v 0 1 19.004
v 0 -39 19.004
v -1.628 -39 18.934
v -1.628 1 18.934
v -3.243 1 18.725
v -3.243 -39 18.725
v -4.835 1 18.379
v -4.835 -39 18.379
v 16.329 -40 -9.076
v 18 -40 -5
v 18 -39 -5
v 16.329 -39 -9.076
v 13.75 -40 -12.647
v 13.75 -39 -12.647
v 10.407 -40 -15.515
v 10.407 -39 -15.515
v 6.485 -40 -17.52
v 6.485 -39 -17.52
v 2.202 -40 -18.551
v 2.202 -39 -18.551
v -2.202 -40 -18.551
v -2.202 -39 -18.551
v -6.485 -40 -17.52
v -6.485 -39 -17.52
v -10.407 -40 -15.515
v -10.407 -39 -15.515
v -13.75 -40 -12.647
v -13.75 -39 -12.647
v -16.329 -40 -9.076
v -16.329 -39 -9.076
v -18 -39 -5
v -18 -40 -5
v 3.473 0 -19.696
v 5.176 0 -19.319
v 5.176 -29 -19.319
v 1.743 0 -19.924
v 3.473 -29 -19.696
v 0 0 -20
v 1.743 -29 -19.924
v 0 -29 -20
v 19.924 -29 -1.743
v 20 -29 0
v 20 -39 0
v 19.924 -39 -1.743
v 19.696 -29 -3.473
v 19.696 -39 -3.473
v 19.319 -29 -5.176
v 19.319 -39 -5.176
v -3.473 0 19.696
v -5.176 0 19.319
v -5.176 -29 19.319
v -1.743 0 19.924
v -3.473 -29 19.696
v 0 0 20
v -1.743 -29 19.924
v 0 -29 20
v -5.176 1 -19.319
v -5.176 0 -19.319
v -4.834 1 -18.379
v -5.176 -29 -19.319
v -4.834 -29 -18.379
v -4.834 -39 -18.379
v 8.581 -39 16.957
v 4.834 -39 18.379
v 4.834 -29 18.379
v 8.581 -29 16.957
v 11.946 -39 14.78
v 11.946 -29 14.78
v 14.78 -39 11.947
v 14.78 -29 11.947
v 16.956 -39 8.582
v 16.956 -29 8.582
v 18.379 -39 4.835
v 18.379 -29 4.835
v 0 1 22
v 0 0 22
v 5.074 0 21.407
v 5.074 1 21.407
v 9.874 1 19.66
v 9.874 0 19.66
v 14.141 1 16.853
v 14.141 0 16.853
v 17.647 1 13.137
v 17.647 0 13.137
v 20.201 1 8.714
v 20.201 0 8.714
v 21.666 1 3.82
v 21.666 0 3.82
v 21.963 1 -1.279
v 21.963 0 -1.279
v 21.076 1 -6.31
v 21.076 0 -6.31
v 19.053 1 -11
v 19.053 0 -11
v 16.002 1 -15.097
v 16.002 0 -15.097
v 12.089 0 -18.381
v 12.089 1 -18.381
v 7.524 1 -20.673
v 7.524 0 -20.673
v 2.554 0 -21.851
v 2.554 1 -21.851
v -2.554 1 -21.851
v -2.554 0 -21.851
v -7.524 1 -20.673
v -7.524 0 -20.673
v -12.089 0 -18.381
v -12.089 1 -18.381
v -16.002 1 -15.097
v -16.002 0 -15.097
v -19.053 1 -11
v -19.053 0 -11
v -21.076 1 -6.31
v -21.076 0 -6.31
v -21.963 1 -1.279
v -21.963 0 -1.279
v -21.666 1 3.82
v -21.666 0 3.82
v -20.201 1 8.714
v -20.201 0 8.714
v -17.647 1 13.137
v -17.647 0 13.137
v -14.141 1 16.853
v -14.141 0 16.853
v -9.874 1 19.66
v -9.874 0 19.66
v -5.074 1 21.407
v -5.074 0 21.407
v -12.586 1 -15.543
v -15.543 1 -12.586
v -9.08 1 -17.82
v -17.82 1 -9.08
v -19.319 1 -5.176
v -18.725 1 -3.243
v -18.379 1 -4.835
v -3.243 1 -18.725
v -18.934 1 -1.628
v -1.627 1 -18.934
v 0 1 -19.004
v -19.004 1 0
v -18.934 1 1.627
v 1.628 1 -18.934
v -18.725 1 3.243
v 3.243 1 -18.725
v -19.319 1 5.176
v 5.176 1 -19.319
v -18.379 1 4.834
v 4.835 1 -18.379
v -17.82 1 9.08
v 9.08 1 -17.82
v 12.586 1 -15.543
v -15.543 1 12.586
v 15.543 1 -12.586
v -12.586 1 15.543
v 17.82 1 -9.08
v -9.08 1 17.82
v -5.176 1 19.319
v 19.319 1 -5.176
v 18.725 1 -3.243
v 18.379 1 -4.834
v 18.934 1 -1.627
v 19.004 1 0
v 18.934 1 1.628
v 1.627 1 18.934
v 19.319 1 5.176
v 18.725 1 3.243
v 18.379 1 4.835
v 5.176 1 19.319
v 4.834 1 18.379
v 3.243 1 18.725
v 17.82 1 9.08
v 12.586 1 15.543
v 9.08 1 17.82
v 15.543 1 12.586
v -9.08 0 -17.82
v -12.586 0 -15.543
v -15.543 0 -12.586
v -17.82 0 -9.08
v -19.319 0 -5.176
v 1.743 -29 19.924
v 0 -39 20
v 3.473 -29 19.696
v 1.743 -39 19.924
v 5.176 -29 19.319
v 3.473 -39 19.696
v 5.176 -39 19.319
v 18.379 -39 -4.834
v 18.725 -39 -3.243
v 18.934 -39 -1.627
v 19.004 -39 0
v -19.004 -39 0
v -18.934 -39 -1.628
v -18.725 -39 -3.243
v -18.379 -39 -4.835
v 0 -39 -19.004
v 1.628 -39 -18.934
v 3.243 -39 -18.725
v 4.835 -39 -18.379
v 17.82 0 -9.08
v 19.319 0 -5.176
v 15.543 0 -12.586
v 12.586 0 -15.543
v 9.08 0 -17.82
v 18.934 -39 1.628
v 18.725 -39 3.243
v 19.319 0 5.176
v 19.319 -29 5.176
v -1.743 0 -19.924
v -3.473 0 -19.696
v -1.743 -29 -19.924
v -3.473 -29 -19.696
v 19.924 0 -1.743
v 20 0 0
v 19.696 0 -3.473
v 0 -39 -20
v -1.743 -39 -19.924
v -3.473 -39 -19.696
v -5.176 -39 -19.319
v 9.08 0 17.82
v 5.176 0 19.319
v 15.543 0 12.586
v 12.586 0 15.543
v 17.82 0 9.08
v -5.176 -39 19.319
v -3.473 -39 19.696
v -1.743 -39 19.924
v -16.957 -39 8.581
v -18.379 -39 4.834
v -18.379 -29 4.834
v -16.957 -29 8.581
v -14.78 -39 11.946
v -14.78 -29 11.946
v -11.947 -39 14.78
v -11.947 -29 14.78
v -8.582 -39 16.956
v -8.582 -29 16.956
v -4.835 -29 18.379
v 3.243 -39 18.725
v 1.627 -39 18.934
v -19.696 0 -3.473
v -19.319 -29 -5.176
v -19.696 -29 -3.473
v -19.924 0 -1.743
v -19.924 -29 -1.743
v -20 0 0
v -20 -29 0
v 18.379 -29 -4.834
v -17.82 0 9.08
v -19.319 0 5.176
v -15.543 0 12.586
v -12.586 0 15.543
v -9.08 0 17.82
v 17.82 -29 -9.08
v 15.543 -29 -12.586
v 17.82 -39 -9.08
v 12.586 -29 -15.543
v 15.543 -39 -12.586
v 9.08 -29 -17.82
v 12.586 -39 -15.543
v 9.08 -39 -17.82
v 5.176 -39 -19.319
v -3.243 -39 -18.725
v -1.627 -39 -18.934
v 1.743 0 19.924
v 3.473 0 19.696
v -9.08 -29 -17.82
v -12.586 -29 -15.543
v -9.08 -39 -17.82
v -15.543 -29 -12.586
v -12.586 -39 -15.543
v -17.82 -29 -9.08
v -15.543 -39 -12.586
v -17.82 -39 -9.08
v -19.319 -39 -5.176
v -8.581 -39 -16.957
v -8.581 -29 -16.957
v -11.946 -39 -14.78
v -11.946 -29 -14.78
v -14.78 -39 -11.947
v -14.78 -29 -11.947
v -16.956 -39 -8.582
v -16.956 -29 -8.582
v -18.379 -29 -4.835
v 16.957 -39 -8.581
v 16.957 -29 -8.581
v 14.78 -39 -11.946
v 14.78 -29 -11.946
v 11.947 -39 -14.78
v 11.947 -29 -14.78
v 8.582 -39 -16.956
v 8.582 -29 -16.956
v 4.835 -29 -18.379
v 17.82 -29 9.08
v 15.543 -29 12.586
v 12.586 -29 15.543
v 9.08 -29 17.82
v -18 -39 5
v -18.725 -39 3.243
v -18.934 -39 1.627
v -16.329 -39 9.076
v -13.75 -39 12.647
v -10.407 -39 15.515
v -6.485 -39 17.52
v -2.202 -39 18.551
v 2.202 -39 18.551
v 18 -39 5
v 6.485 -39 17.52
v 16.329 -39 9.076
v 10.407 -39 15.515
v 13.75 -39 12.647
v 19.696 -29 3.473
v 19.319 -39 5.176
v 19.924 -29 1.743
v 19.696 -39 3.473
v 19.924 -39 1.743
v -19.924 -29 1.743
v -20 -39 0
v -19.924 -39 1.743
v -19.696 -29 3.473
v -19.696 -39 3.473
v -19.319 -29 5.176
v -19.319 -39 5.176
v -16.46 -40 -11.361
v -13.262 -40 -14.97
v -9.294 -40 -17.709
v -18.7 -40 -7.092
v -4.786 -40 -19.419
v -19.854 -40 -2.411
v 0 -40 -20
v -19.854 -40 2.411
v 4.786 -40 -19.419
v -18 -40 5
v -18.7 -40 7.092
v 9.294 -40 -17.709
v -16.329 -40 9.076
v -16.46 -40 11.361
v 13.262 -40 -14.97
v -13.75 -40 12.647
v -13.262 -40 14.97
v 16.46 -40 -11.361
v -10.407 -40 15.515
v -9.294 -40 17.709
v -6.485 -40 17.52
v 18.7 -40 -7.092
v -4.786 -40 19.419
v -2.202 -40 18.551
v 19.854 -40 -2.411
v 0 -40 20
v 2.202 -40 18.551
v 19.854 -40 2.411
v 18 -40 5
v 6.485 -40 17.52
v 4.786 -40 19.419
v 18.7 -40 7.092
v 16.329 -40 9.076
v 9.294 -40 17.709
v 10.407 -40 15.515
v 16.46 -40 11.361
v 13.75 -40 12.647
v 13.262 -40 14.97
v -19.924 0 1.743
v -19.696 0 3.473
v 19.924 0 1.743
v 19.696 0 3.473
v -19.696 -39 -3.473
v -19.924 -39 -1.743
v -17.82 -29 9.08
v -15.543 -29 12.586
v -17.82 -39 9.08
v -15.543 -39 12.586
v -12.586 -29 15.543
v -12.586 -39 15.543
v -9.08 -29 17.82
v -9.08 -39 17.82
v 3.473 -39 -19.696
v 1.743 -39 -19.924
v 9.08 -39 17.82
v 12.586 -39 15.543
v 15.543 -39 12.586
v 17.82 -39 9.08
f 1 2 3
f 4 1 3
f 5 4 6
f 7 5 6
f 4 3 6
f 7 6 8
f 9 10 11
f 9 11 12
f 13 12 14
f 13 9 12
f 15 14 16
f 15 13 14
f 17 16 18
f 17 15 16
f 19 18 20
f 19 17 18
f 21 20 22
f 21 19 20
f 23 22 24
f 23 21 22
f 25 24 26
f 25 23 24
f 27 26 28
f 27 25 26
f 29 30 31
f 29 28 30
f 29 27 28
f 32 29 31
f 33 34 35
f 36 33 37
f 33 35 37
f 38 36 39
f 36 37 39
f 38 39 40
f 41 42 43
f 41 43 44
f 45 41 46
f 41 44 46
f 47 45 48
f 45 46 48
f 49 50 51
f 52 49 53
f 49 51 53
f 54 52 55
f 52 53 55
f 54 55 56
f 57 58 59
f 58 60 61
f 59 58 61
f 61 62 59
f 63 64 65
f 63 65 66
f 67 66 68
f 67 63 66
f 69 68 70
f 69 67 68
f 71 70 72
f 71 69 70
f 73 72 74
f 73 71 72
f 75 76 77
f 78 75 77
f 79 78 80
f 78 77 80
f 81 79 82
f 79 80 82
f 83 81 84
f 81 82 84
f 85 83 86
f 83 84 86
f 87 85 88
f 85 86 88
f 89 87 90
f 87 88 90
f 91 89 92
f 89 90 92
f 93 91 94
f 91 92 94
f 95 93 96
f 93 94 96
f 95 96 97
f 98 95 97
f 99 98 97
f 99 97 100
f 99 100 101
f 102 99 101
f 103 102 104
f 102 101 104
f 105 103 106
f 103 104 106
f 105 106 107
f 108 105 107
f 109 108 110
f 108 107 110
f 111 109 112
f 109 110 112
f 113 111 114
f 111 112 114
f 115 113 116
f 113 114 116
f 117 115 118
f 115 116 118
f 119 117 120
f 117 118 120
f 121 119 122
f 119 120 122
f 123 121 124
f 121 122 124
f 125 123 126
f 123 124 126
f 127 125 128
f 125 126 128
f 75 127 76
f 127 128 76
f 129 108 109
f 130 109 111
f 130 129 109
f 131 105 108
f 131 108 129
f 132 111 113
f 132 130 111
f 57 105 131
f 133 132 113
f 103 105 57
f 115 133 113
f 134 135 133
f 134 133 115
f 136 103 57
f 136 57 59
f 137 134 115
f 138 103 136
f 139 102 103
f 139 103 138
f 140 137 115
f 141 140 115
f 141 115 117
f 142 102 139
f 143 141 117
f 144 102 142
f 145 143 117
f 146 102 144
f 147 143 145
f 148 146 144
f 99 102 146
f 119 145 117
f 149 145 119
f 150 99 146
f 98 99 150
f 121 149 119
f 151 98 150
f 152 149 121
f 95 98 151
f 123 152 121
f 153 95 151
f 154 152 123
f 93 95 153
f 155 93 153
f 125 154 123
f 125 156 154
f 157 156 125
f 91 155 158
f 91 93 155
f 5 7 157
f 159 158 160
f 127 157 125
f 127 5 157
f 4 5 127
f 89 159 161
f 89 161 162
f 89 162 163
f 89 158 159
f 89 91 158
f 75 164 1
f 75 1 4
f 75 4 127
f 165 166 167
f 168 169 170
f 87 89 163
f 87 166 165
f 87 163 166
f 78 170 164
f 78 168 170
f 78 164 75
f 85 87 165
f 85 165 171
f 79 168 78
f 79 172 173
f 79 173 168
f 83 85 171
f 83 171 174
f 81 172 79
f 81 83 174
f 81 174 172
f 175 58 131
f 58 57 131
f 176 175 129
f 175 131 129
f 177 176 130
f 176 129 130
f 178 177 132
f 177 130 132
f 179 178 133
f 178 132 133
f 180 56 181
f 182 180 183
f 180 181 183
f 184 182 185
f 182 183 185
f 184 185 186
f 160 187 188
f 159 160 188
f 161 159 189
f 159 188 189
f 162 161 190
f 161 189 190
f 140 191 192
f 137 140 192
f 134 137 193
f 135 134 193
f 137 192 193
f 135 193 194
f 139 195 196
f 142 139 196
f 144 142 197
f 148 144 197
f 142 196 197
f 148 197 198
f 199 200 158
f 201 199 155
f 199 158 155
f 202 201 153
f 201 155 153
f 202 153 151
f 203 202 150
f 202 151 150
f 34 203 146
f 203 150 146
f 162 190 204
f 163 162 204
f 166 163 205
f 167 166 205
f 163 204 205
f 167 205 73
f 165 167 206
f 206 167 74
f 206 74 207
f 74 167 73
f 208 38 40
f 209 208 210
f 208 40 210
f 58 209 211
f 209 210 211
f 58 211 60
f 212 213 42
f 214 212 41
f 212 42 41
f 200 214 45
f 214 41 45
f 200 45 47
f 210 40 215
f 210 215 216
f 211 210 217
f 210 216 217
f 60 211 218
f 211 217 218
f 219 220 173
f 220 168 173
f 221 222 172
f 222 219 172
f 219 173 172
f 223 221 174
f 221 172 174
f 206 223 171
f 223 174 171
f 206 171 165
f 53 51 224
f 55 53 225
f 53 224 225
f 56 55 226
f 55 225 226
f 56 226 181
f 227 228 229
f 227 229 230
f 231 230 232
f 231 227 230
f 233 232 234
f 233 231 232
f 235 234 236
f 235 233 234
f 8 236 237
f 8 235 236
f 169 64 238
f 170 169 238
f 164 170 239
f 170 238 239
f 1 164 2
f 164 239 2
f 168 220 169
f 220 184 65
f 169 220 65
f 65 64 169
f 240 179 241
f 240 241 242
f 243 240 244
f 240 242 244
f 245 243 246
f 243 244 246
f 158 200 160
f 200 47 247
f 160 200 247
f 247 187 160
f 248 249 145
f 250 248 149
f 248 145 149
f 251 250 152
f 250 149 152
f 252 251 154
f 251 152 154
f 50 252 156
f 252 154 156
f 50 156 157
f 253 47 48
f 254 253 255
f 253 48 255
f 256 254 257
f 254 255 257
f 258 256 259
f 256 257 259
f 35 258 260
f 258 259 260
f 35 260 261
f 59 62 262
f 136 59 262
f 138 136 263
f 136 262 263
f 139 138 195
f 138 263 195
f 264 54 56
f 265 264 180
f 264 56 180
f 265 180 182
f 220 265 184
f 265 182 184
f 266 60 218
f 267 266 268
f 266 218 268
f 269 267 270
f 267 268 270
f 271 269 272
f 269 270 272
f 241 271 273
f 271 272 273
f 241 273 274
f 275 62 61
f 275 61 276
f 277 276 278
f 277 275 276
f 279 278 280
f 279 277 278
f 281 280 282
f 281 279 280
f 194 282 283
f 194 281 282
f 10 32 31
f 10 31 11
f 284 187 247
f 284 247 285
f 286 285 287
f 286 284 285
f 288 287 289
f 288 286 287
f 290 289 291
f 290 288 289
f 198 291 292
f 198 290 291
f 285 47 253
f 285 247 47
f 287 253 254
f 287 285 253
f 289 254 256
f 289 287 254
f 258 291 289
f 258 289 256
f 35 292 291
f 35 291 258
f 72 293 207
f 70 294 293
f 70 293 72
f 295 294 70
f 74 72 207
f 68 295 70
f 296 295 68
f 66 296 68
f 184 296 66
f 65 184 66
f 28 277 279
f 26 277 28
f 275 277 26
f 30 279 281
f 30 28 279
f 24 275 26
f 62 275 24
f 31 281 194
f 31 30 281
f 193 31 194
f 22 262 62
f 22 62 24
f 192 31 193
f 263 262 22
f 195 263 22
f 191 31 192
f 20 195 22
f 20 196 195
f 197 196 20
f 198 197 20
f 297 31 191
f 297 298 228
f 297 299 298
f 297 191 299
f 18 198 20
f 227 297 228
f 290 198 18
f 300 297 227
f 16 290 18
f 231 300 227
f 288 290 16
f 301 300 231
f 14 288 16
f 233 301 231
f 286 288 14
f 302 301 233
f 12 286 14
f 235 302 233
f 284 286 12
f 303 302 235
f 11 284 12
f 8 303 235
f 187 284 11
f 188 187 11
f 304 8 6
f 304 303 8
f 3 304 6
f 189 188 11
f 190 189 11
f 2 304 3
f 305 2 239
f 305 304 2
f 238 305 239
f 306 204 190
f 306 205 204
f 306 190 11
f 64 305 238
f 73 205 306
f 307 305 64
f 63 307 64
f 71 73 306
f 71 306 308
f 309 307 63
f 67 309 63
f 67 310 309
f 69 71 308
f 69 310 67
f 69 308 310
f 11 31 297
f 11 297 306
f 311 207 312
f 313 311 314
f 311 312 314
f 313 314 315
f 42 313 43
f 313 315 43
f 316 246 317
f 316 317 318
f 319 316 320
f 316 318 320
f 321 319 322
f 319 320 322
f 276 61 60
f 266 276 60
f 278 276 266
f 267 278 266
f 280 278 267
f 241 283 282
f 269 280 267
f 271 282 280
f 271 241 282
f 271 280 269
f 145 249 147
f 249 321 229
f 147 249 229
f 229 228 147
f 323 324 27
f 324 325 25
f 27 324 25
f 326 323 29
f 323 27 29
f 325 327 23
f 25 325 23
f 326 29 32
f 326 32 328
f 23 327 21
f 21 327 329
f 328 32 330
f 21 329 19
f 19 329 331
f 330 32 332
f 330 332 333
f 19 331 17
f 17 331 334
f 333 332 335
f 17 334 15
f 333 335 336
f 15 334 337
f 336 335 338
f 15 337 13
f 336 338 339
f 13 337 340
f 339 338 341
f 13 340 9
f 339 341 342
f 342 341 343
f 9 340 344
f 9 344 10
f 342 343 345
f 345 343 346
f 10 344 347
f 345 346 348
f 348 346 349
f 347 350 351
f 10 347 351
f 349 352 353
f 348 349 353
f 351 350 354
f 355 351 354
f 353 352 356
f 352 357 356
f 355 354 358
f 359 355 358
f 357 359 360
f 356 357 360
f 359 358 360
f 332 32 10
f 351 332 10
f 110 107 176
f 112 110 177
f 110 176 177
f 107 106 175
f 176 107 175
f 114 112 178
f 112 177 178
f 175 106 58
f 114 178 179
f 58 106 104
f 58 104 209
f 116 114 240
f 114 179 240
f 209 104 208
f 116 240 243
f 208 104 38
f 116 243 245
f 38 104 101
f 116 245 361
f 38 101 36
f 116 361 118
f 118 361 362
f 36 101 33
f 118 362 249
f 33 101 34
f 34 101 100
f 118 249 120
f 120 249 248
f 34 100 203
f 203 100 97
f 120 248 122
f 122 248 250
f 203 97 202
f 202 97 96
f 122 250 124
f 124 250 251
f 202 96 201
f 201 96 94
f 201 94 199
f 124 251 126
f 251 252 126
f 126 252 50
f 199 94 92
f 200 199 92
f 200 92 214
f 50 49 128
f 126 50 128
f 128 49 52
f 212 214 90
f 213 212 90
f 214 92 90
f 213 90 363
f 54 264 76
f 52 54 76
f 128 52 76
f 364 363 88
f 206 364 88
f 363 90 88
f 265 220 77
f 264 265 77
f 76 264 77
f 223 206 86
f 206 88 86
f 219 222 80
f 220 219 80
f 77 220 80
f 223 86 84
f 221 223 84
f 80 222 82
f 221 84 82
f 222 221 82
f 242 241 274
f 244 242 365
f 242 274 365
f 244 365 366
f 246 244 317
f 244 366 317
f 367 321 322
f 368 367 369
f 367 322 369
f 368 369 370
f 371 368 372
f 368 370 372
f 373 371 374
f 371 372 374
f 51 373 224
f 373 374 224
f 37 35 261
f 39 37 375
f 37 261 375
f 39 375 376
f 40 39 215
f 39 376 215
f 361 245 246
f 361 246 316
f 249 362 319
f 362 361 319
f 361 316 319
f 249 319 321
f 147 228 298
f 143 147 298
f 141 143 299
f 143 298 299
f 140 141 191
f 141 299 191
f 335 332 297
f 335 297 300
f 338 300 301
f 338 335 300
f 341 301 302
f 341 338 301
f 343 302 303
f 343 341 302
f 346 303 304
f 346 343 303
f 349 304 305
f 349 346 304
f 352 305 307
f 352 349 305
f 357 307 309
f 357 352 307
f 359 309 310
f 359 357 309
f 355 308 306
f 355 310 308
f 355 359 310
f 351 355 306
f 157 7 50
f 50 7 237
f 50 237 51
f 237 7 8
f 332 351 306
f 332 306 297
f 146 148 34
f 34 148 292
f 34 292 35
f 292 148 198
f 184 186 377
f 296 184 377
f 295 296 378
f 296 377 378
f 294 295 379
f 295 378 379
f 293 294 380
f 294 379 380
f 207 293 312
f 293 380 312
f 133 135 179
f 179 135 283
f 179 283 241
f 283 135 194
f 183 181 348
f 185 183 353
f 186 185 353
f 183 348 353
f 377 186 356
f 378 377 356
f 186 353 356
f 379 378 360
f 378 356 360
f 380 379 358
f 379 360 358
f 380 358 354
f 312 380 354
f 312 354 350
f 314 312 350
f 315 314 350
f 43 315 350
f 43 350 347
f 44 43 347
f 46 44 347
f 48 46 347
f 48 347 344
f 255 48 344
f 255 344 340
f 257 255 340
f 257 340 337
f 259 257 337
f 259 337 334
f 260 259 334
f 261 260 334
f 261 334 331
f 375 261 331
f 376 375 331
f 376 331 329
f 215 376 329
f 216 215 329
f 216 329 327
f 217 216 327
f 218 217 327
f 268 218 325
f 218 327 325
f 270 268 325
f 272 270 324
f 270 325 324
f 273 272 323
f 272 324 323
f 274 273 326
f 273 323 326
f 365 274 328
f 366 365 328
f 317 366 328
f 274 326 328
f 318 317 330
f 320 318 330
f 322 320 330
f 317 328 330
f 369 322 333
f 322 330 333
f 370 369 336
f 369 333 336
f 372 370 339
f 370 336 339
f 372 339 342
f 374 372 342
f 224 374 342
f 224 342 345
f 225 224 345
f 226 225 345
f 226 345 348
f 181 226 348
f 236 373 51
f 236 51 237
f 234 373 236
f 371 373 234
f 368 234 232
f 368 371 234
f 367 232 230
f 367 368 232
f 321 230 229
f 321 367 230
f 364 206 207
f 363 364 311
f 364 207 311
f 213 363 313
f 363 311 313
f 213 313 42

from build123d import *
from build123d.topology import SkipClean

# Parameters (mm, degrees)
SKETCH1_R           = 22
BOSS_EXTRUDE1_DEPTH = 1
SKETCH2_R           = 20
CUT_EXTRUDE1_DEPTH  = 1
SKETCH3_R           = 20
BOSS_EXTRUDE2_DEPTH = 1
BOSS_EXTRUDE3_REACH = 52.675
SKETCH5_R           = 20
SKETCH5_R_2         = 19.004147065
BOSS_EXTRUDE4_DEPTH = 10
CUT_EXTRUDE2_DEPTH  = 10


with BuildPart() as part:
    # Sketch1 → Boss-Extrude1 (new body)
    with BuildSketch(Plane(origin=(0, 0, 0), x_dir=(1, 0, 0), z_dir=(0, 1, 0))):
        with Locations(Location((0, 0, 0), (0, 0, 270))):
            Circle(SKETCH1_R)
    extrude(amount=BOSS_EXTRUDE1_DEPTH)

    # Sketch2 → Cut-Extrude1 (cut)
    with BuildSketch(Plane(origin=(0, 1, 0), x_dir=(1, 0, 0), z_dir=(0, 1, 0))):
        with Locations(Location((0, 0, 0), (0, 0, 270))):
            Circle(SKETCH2_R)
    extrude(amount=-CUT_EXTRUDE1_DEPTH, mode=Mode.SUBTRACT)

    # Boss-Extrude3: up to this face of the body (flat: up to its plane)
    boss_extrude3_end = Plane(part.part.faces().sort_by_distance((0, 1, -21.377746033))[0])
    # Sketch4 → Boss-Extrude3 (add, up to the picked face)
    with BuildSketch(Plane(origin=(0, -39, 0), x_dir=(1, 0, 0), z_dir=(0, 1, 0)), mode=Mode.PRIVATE) as boss_extrude3_sk1:
        with BuildLine():
            Line((-5.176380902, 19.318516526), (-4.834360759, 18.378823905))
            ThreePointArc((-4.834360759, 18.378823905), (-2.437308738, 18.847061792), (0, 19.004005159))
            ThreePointArc((0, 19.004005159), (2.437764249, 18.84700288), (4.835249142, 18.378590202))
            Line((4.835249142, 18.378590202), (5.176380902, 19.318516526))
            ThreePointArc((5.176380902, 19.318516526), (2.610523844, 19.828897227), (0, 20))
            ThreePointArc((0, 20), (-2.610523844, 19.828897227), (-5.176380902, 19.318516526))
        make_face()
    boss_extrude3_tool1 = split(extrude(boss_extrude3_sk1.sketch, amount=BOSS_EXTRUDE3_REACH, mode=Mode.PRIVATE), bisect_by=boss_extrude3_end, keep=Keep.BOTH, mode=Mode.PRIVATE)
    # Sketch4 → Boss-Extrude3 (add, up to the picked face)
    with BuildSketch(Plane(origin=(0, -39, 0), x_dir=(1, 0, 0), z_dir=(0, 1, 0)), mode=Mode.PRIVATE) as boss_extrude3_sk2:
        with BuildLine():
            Line((19.318516526, 5.176380902), (18.378823905, 4.834360759))
            ThreePointArc((18.378823905, 4.834360759), (18.847061792, 2.437308738), (19.004005159, 0))
            ThreePointArc((19.004005159, 0), (18.84700288, -2.437764249), (18.378590202, -4.835249142))
            Line((18.378590202, -4.835249142), (19.318516526, -5.176380902))
            ThreePointArc((19.318516526, -5.176380902), (19.828897227, -2.610523844), (20, 0))
            ThreePointArc((20, 0), (19.828897227, 2.610523844), (19.318516526, 5.176380902))
        make_face()
    boss_extrude3_tool2 = split(extrude(boss_extrude3_sk2.sketch, amount=BOSS_EXTRUDE3_REACH, mode=Mode.PRIVATE), bisect_by=boss_extrude3_end, keep=Keep.BOTH, mode=Mode.PRIVATE)
    # Sketch4 → Boss-Extrude3 (add, up to the picked face)
    with BuildSketch(Plane(origin=(0, -39, 0), x_dir=(1, 0, 0), z_dir=(0, 1, 0)), mode=Mode.PRIVATE) as boss_extrude3_sk3:
        with BuildLine():
            Line((5.176380902, -19.318516526), (4.834360759, -18.378823905))
            ThreePointArc((4.834360759, -18.378823905), (2.437308738, -18.847061792), (0, -19.004005159))
            ThreePointArc((0, -19.004005159), (-2.437764249, -18.84700288), (-4.835249142, -18.378590202))
            Line((-4.835249142, -18.378590202), (-5.176380902, -19.318516526))
            ThreePointArc((-5.176380902, -19.318516526), (-2.610523844, -19.828897227), (0, -20))
            ThreePointArc((0, -20), (2.610523844, -19.828897227), (5.176380902, -19.318516526))
        make_face()
    boss_extrude3_tool3 = split(extrude(boss_extrude3_sk3.sketch, amount=BOSS_EXTRUDE3_REACH, mode=Mode.PRIVATE), bisect_by=boss_extrude3_end, keep=Keep.BOTH, mode=Mode.PRIVATE)
    # Sketch4 → Boss-Extrude3 (add, up to the picked face)
    with BuildSketch(Plane(origin=(0, -39, 0), x_dir=(1, 0, 0), z_dir=(0, 1, 0)), mode=Mode.PRIVATE) as boss_extrude3_sk4:
        with BuildLine():
            Line((-19.318516526, -5.176380902), (-18.378823905, -4.834360759))
            ThreePointArc((-18.378823905, -4.834360759), (-18.847061792, -2.437308738), (-19.004005159, 0))
            ThreePointArc((-19.004005159, 0), (-18.84700288, 2.437764249), (-18.378590202, 4.835249142))
            Line((-18.378590202, 4.835249142), (-19.318516526, 5.176380902))
            ThreePointArc((-19.318516526, 5.176380902), (-19.828897227, 2.610523844), (-20, 0))
            ThreePointArc((-20, 0), (-19.828897227, -2.610523844), (-19.318516526, -5.176380902))
        make_face()
    boss_extrude3_tool4 = split(extrude(boss_extrude3_sk4.sketch, amount=BOSS_EXTRUDE3_REACH, mode=Mode.PRIVATE), bisect_by=boss_extrude3_end, keep=Keep.BOTH, mode=Mode.PRIVATE)


with BuildPart() as body_2:
    # Sketch3 → Boss-Extrude2 (new body)
    with BuildSketch(Plane(origin=(0, -40, 0), x_dir=(1, 0, 0), z_dir=(0, 1, 0))):
        with Locations(Location((0, 0, 0), (0, 0, 270))):
            Circle(SKETCH3_R)
    extrude(amount=BOSS_EXTRUDE2_DEPTH)


with BuildPart() as part_1:
    add(part.part)

    add(body_2.part)  # Boss-Extrude3 merges body 2
    add(boss_extrude3_tool1.solids().sort_by(Axis((0.000224, -39, -19.289315), (0, 1, 0)))[0])
    add(boss_extrude3_tool2.solids().sort_by(Axis((19.289315, -39, 0.000224), (0, 1, 0)))[0])
    add(boss_extrude3_tool3.solids().sort_by(Axis((-0.000224, -39, 19.289315), (0, 1, 0)))[0])
    add(boss_extrude3_tool4.solids().sort_by(Axis((-19.289315, -39, -0.000224), (0, 1, 0)))[0])

    # Sketch5 → Boss-Extrude4 (add)
    with SkipClean():  # the faces are left unmerged after this step: merging them gives an invalid solid
        with BuildSketch(Plane(origin=(0, -39, 0), x_dir=(1, 0, 0), z_dir=(0, 1, 0))):
            with Locations(Location((0, 0, 0), (0, 0, 105))):
                Circle(SKETCH5_R)
            Circle(SKETCH5_R_2, mode=Mode.SUBTRACT)
        extrude(amount=BOSS_EXTRUDE4_DEPTH)

    # Sketch6 → Cut-Extrude2 (cut)
    with SkipClean():  # the faces are left unmerged after this step: merging them gives an invalid solid
        with BuildSketch(Plane.XZ.offset(40)):
            with BuildLine():
                ThreePointArc((-18, 5), (0, 18.681541692), (18, 5))
                Line((18, 5), (-18, 5))
            make_face()
            with BuildLine():
                Line((-18, -5), (18, -5))
                ThreePointArc((18, -5), (0, -18.681541692), (-18, -5))
            make_face()
        extrude(amount=-CUT_EXTRUDE2_DEPTH, mode=Mode.SUBTRACT)


solid = part_1.part
